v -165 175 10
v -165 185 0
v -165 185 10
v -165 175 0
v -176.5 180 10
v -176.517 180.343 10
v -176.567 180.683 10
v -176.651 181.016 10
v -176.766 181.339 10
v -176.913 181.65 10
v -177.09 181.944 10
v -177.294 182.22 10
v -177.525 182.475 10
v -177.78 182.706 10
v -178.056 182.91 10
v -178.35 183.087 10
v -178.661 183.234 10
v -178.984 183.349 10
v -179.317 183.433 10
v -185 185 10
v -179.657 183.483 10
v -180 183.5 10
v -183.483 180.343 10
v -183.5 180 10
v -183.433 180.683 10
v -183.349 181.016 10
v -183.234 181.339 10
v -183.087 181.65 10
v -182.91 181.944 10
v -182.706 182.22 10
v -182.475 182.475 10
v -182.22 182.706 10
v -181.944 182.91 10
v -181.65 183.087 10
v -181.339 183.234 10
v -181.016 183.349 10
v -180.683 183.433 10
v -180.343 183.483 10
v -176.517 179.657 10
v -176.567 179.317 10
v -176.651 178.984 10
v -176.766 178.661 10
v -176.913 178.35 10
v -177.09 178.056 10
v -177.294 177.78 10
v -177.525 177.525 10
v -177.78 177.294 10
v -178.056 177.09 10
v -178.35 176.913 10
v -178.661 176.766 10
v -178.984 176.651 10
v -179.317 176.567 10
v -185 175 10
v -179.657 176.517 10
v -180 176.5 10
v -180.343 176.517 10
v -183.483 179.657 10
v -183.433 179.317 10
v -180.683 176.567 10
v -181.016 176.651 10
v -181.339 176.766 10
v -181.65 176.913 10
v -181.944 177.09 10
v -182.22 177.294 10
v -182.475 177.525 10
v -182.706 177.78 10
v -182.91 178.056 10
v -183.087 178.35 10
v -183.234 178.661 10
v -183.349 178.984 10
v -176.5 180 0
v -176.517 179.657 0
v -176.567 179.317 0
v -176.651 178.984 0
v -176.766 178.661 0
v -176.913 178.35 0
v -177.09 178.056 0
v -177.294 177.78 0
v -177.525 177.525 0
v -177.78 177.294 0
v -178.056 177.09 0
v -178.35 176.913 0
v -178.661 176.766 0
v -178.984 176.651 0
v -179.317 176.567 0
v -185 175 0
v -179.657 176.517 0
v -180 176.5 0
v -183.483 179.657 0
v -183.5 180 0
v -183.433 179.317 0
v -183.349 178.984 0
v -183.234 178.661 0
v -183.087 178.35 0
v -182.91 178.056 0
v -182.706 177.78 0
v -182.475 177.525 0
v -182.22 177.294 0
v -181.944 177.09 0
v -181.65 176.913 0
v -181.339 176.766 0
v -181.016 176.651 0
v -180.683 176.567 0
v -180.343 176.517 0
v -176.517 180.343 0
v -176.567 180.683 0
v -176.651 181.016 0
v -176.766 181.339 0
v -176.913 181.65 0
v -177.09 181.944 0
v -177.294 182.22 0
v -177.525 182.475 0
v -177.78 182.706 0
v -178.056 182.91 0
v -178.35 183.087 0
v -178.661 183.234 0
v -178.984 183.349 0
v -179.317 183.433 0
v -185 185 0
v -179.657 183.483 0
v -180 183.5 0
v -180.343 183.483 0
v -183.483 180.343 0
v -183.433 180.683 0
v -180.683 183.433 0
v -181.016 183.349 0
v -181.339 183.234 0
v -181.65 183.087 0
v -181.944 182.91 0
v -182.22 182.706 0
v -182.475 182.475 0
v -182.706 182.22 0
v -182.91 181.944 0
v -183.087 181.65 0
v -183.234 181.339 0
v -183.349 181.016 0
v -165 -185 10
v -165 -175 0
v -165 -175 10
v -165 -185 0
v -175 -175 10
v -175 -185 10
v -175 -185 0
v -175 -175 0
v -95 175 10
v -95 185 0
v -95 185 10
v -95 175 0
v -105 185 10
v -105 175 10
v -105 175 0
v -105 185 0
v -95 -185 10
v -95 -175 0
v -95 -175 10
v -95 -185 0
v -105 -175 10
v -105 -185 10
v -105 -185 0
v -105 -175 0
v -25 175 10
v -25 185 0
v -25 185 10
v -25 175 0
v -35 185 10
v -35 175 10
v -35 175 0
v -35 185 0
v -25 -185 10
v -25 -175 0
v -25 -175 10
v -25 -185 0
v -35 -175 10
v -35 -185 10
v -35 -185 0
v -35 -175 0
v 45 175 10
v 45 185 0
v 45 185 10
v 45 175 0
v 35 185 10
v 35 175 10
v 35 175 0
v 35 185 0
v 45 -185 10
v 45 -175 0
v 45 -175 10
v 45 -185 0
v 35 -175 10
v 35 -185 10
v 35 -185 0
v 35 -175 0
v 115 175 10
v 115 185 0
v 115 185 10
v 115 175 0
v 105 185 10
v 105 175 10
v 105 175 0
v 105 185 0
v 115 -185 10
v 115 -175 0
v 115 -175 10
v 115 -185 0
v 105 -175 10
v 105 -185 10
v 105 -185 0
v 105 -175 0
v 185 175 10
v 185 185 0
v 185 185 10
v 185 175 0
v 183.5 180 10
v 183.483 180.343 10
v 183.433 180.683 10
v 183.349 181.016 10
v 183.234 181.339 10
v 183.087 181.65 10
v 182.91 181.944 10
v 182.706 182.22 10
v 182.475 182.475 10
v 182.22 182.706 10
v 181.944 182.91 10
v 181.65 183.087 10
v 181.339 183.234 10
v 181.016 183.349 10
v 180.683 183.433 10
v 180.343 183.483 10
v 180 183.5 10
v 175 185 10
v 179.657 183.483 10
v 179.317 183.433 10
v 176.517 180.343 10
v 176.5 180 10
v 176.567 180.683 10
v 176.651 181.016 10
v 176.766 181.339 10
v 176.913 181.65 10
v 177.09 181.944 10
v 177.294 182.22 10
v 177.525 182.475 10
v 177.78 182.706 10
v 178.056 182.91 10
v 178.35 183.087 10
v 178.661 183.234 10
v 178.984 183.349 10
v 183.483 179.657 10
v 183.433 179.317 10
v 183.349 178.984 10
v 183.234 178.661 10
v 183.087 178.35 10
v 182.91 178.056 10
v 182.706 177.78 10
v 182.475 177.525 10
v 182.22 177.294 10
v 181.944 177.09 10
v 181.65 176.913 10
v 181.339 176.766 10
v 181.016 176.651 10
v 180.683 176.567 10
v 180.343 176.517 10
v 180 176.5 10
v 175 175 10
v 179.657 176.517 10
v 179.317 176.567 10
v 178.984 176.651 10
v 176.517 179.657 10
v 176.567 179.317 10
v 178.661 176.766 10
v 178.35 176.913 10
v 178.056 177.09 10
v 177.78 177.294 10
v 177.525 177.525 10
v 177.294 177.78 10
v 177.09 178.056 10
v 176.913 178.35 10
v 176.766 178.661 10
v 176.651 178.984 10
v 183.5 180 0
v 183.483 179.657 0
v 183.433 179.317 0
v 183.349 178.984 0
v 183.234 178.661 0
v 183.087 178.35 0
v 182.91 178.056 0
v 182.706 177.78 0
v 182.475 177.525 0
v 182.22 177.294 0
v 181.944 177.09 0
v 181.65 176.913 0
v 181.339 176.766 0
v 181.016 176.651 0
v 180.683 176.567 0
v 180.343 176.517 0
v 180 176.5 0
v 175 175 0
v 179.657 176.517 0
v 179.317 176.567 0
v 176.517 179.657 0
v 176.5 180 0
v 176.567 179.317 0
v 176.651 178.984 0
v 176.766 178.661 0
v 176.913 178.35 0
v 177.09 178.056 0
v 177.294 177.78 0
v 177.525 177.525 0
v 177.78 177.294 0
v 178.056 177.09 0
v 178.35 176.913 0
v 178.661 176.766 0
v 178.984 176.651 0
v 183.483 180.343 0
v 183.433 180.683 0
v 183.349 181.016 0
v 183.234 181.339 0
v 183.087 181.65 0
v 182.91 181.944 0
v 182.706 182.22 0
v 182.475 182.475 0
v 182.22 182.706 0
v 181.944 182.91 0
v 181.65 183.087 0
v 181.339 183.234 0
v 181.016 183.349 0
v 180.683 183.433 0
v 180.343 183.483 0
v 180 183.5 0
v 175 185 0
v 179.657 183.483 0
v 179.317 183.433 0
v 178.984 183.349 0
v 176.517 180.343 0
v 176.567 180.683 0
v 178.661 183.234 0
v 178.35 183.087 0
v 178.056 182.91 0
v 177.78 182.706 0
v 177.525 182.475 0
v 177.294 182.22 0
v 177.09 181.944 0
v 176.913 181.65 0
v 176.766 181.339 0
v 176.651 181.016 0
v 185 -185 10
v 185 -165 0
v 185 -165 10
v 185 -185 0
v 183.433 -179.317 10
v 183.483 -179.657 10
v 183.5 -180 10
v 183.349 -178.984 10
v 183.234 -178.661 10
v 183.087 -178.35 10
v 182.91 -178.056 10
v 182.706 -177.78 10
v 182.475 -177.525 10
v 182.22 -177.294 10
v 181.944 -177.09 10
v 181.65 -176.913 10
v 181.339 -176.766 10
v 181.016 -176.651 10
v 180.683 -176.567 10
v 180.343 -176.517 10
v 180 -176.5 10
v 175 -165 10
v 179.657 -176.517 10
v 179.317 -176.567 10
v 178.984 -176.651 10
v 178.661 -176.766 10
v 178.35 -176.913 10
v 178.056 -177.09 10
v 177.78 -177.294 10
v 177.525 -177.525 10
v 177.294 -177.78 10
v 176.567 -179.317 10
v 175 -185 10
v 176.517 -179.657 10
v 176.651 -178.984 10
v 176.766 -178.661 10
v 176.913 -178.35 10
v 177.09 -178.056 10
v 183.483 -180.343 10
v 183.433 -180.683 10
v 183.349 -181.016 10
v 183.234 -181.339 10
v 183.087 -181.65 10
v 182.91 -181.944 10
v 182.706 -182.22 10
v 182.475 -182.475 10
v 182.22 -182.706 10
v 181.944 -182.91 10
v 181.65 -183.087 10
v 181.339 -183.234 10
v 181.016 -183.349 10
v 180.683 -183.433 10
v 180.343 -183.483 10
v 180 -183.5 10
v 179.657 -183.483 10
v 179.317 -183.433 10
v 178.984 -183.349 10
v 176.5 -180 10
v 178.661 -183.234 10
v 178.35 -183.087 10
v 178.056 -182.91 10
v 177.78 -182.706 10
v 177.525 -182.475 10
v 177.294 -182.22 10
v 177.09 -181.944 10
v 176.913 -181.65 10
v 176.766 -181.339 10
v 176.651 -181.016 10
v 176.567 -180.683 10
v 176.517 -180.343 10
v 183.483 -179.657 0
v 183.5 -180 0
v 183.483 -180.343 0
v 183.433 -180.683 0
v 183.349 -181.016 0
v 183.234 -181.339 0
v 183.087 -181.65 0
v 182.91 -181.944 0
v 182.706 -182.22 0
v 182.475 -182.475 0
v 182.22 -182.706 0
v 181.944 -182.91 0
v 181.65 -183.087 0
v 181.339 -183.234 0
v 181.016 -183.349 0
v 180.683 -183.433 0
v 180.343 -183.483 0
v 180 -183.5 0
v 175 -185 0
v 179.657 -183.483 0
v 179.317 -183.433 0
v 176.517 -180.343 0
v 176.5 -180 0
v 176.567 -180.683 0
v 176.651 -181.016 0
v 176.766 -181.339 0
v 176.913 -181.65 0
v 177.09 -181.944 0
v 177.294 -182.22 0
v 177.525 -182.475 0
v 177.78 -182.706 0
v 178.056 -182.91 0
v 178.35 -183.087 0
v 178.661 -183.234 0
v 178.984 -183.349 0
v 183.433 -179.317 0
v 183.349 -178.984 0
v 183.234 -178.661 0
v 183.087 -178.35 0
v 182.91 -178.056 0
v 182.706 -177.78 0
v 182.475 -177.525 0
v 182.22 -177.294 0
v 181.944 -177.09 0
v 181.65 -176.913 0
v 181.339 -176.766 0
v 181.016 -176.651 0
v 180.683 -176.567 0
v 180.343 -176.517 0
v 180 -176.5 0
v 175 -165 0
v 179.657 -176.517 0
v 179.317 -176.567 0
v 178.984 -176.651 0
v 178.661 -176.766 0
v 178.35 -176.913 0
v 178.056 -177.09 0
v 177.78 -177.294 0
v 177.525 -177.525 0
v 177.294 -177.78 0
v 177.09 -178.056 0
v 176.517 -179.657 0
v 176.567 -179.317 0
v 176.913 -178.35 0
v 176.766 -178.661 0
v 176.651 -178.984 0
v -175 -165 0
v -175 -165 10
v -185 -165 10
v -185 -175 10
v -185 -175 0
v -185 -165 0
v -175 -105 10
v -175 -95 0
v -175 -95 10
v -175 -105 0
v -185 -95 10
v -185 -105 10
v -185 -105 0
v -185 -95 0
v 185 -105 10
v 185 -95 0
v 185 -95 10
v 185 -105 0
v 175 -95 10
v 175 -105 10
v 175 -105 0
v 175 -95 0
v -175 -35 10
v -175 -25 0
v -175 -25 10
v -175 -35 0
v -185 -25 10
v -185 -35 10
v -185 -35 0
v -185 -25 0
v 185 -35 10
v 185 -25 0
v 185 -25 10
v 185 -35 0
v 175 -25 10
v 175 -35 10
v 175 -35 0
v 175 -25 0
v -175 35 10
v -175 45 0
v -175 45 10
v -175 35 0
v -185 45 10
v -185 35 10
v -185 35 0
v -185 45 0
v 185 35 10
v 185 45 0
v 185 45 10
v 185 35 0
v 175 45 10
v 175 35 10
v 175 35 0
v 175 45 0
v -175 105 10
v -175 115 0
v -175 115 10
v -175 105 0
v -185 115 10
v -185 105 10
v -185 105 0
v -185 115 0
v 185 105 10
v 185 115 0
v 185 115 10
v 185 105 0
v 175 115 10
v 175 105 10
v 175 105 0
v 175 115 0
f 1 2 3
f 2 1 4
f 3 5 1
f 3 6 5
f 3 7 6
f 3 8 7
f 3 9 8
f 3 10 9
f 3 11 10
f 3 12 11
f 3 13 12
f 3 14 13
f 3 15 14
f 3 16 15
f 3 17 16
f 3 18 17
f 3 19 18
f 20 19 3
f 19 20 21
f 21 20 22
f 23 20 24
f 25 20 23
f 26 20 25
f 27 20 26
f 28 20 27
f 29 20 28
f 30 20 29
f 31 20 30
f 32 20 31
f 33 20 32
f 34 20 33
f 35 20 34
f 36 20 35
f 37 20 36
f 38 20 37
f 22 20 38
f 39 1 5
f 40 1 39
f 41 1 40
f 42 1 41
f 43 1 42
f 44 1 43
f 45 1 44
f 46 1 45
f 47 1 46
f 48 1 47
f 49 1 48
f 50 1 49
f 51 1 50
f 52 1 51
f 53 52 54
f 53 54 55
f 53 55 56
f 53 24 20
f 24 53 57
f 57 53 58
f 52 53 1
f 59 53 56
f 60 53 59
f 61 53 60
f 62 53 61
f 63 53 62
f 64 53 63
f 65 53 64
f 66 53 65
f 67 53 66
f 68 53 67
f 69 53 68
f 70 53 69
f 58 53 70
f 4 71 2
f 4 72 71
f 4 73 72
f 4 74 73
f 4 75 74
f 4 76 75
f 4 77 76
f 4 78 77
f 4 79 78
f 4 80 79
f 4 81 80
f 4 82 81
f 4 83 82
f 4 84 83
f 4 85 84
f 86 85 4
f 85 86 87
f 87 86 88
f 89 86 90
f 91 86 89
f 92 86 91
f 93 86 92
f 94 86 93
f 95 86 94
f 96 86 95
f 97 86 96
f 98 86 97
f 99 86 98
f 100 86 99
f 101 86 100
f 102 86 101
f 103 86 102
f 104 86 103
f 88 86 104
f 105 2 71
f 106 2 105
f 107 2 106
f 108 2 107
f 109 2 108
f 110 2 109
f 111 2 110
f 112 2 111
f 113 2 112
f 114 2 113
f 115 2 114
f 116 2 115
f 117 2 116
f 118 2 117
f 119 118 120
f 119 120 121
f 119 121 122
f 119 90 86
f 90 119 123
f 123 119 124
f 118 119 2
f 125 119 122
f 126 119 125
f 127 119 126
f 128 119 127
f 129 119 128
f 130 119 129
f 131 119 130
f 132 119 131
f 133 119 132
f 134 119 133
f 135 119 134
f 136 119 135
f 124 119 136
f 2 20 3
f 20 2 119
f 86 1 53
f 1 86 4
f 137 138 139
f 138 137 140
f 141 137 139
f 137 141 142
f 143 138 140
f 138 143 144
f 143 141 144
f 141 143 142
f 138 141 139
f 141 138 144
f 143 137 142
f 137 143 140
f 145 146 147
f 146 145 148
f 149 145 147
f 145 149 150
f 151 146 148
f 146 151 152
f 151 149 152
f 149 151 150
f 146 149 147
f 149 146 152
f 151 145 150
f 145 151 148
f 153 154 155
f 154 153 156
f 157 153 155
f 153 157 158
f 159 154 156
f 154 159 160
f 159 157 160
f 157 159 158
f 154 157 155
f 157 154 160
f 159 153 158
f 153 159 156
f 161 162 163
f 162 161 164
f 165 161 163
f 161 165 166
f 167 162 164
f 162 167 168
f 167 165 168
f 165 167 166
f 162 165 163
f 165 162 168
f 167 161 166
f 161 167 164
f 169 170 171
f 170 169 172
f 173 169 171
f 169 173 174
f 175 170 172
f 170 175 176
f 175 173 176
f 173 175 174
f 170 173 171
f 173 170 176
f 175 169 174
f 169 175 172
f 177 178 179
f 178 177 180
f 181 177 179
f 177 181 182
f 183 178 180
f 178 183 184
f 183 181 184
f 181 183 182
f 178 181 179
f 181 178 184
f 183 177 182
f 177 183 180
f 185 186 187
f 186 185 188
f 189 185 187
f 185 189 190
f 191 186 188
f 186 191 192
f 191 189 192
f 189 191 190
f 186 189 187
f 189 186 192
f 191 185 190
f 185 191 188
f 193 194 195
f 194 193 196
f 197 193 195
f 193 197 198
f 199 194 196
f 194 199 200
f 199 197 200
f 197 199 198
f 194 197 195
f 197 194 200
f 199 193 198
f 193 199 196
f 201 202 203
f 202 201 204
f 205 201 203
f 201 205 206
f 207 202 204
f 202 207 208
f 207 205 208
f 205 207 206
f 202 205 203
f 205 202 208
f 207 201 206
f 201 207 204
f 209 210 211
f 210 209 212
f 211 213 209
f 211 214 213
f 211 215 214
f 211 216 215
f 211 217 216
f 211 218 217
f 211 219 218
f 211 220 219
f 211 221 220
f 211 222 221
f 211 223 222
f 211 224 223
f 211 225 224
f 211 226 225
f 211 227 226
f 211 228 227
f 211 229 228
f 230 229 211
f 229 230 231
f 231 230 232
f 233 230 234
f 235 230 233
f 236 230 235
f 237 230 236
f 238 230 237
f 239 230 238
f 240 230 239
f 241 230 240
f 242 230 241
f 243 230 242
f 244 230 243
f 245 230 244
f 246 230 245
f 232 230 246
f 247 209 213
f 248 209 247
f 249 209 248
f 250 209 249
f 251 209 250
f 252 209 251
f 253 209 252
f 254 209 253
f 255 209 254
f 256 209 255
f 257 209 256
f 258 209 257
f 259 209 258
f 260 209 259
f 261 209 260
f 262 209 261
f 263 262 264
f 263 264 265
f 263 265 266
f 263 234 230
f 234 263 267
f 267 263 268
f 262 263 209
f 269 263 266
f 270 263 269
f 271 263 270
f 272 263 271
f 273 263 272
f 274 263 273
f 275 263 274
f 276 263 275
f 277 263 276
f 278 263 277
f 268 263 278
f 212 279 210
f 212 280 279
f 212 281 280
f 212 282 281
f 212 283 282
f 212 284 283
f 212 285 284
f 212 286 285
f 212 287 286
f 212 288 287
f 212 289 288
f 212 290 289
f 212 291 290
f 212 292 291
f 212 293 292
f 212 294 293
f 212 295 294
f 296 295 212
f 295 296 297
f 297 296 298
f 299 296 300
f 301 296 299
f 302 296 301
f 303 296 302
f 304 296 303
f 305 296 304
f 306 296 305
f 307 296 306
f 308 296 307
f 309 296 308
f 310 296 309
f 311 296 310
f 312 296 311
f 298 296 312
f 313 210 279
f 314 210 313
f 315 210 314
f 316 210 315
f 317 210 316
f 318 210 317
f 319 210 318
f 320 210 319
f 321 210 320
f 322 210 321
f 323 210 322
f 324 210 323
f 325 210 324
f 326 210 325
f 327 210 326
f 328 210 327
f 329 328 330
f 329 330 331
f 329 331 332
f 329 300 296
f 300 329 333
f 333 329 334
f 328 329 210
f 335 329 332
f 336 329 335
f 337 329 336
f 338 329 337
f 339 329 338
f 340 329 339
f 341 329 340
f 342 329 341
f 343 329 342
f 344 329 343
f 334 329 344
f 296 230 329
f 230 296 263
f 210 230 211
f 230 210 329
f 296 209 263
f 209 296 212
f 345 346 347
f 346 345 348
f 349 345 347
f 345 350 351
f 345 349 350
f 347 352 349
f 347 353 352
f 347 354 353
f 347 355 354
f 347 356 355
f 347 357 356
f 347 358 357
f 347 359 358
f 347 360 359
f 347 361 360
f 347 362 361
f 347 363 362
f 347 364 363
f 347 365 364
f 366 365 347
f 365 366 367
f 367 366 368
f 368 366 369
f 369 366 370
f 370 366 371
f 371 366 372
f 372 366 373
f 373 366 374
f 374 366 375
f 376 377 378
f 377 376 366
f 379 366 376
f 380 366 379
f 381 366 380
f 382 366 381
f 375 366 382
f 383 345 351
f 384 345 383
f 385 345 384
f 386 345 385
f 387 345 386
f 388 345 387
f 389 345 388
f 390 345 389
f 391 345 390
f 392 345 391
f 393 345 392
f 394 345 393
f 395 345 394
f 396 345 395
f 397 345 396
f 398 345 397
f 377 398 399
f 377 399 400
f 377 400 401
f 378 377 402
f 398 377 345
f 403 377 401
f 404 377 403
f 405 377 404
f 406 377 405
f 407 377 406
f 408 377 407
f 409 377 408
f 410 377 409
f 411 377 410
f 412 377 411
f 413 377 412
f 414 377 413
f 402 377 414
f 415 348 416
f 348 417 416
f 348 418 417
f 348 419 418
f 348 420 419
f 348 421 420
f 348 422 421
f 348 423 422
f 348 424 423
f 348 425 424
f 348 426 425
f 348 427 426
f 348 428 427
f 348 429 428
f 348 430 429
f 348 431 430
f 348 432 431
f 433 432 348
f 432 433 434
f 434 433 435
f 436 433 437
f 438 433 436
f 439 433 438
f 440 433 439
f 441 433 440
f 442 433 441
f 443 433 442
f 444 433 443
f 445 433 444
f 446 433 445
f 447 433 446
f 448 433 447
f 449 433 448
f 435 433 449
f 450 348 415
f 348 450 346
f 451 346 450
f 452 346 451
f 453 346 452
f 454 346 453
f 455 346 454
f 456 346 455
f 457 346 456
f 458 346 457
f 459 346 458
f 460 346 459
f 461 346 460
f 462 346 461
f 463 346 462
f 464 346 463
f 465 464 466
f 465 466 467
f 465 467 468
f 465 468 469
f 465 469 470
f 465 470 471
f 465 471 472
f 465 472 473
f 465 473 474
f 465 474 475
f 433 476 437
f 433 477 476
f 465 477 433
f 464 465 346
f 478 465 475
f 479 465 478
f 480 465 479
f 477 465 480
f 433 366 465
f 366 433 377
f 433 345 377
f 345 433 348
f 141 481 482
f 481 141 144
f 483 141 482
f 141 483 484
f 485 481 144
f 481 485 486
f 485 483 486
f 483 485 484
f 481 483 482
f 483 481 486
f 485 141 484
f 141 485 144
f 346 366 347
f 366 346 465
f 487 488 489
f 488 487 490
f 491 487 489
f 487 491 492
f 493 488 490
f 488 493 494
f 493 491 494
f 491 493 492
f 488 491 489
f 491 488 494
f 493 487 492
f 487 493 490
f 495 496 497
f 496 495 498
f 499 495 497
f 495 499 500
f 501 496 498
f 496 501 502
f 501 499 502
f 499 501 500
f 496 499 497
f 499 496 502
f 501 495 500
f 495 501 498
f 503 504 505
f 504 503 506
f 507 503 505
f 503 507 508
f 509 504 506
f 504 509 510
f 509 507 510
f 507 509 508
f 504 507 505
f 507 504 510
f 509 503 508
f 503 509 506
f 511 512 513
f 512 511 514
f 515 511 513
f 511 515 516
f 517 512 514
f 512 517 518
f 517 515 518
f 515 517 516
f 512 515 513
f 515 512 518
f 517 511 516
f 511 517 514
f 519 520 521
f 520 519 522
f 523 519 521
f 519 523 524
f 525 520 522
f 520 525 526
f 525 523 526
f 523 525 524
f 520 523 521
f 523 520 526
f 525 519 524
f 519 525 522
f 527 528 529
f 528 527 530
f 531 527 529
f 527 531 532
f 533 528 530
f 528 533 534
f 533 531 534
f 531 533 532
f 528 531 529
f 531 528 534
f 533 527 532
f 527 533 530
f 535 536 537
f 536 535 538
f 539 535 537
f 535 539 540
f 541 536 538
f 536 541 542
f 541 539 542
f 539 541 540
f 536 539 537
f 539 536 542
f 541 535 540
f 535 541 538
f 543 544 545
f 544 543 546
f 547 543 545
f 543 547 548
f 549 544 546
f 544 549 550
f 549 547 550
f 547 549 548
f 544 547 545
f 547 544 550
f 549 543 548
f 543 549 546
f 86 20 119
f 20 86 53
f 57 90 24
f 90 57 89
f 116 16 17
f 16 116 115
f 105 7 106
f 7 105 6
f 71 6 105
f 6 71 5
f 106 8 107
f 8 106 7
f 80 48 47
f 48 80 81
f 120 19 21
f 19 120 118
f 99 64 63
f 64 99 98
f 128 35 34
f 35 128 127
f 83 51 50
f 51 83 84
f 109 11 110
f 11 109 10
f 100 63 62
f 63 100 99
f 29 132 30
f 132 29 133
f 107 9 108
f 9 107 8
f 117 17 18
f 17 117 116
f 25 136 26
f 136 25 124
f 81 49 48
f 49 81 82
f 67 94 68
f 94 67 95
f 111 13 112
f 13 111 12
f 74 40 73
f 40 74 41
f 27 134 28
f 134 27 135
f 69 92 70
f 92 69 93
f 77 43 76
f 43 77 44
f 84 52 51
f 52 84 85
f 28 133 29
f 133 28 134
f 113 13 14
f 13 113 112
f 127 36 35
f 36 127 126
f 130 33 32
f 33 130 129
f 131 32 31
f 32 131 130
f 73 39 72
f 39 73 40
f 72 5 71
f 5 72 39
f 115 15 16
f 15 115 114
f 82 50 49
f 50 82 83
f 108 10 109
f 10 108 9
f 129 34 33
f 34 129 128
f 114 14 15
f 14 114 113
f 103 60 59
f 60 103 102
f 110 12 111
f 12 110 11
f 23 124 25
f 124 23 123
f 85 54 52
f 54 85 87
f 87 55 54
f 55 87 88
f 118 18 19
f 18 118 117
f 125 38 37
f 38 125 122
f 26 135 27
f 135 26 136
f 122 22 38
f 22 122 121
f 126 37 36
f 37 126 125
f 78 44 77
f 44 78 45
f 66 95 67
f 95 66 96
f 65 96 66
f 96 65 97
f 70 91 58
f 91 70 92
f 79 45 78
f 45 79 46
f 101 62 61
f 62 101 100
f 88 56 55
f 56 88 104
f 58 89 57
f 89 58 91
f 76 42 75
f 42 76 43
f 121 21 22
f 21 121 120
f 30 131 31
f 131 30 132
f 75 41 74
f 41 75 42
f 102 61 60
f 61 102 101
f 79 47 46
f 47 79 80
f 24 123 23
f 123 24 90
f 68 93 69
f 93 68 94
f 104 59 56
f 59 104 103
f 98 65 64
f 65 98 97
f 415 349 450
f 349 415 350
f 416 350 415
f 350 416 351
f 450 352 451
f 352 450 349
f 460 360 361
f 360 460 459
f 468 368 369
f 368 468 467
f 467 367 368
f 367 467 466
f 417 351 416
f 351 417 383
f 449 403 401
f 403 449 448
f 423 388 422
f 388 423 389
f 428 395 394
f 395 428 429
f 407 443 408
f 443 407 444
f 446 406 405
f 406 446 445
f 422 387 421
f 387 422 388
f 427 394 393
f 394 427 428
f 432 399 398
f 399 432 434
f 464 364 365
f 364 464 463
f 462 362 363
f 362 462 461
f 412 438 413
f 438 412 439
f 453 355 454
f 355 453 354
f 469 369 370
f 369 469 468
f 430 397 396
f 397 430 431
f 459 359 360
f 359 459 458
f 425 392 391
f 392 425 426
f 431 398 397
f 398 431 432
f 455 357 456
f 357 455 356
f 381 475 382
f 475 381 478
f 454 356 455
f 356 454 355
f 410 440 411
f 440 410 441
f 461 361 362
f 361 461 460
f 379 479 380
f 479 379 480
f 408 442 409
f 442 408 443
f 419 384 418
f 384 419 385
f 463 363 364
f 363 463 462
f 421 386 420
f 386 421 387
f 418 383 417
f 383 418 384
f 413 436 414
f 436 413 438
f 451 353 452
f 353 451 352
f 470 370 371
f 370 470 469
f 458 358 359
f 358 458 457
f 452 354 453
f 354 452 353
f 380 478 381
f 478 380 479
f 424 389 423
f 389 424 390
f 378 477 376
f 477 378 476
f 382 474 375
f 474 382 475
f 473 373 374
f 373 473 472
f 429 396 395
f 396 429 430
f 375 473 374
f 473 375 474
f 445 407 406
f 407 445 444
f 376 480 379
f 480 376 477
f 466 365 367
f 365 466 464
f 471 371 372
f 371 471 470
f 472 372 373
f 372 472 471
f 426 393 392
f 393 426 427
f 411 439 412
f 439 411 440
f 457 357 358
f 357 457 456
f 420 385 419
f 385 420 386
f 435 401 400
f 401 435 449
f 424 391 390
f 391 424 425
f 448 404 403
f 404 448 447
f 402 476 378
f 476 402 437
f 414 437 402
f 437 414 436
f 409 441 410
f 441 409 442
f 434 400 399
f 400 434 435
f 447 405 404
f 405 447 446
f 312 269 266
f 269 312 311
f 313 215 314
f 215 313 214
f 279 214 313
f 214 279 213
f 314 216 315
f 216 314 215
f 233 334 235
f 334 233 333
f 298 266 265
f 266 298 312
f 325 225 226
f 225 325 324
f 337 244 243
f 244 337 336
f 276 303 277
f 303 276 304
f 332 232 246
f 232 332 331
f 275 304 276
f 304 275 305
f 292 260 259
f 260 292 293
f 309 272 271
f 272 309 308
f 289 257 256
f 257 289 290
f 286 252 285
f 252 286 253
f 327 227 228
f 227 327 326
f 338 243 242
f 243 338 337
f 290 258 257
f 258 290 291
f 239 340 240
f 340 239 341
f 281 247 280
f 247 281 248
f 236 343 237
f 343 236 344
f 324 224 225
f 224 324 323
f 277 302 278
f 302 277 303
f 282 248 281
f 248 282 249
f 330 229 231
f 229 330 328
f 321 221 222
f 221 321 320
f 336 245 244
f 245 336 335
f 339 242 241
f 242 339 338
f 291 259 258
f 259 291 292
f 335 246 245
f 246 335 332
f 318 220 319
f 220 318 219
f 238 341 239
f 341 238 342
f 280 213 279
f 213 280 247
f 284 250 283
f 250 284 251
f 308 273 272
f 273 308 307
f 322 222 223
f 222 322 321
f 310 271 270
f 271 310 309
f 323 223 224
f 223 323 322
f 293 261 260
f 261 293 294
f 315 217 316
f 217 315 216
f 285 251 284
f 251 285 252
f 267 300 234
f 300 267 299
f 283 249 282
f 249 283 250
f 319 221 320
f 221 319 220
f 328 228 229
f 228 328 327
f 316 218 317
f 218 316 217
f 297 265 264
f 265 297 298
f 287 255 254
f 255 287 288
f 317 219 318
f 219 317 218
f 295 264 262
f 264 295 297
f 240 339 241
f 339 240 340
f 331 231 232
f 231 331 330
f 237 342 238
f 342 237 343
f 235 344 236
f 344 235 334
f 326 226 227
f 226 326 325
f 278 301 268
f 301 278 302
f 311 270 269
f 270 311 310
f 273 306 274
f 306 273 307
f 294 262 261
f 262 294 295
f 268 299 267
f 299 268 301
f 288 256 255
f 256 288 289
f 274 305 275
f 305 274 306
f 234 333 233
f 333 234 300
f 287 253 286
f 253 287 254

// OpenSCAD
// ring_60.scad - ring index 60 (z bottom = 600 mm)
$fn = 64; bar = 10; half_b = bar/2; outer = 370; half_outer = outer/2;
front_y = 180; back_y = -180; left_x = -180; right_x = 180;
x_centers = [-170, -100, -30, 40, 110, 180];
z_centers = [5, 85, 155, 225, 295, 365, 435, 505, 575, 645, 715]; ring_z = 600;
module place_box(cx, cy, sx, sy) { translate([cx - sx/2, cy - sy/2, 0]) cube([sx, sy, bar]); }

difference() { union() {
    for (x = x_centers) { place_box(x, front_y, bar, bar); place_box(x, back_y, bar, bar); }
    for (y = x_centers) { place_box(left_x, y, bar, bar); place_box(right_x, y, bar, bar); }
    for (zc = z_centers) if ((zc - half_b < ring_z + bar) && (zc + half_b > ring_z)) {
        translate([-half_outer, front_y - half_b, 0]) cube([outer, bar, bar]);
        translate([-half_outer, back_y - half_b, 0])  cube([outer, bar, bar]);
        translate([left_x - half_b, -half_outer, 0])  cube([bar, outer, bar]);
        translate([right_x - half_b, -half_outer, 0]) cube([bar, outer, bar]);
    }
  }
  for (cx = [-180, 180]) for (cy = [-180, 180]) translate([cx, cy, 0]) cylinder(h = bar, r = 3.5, $fn = 64);
}
